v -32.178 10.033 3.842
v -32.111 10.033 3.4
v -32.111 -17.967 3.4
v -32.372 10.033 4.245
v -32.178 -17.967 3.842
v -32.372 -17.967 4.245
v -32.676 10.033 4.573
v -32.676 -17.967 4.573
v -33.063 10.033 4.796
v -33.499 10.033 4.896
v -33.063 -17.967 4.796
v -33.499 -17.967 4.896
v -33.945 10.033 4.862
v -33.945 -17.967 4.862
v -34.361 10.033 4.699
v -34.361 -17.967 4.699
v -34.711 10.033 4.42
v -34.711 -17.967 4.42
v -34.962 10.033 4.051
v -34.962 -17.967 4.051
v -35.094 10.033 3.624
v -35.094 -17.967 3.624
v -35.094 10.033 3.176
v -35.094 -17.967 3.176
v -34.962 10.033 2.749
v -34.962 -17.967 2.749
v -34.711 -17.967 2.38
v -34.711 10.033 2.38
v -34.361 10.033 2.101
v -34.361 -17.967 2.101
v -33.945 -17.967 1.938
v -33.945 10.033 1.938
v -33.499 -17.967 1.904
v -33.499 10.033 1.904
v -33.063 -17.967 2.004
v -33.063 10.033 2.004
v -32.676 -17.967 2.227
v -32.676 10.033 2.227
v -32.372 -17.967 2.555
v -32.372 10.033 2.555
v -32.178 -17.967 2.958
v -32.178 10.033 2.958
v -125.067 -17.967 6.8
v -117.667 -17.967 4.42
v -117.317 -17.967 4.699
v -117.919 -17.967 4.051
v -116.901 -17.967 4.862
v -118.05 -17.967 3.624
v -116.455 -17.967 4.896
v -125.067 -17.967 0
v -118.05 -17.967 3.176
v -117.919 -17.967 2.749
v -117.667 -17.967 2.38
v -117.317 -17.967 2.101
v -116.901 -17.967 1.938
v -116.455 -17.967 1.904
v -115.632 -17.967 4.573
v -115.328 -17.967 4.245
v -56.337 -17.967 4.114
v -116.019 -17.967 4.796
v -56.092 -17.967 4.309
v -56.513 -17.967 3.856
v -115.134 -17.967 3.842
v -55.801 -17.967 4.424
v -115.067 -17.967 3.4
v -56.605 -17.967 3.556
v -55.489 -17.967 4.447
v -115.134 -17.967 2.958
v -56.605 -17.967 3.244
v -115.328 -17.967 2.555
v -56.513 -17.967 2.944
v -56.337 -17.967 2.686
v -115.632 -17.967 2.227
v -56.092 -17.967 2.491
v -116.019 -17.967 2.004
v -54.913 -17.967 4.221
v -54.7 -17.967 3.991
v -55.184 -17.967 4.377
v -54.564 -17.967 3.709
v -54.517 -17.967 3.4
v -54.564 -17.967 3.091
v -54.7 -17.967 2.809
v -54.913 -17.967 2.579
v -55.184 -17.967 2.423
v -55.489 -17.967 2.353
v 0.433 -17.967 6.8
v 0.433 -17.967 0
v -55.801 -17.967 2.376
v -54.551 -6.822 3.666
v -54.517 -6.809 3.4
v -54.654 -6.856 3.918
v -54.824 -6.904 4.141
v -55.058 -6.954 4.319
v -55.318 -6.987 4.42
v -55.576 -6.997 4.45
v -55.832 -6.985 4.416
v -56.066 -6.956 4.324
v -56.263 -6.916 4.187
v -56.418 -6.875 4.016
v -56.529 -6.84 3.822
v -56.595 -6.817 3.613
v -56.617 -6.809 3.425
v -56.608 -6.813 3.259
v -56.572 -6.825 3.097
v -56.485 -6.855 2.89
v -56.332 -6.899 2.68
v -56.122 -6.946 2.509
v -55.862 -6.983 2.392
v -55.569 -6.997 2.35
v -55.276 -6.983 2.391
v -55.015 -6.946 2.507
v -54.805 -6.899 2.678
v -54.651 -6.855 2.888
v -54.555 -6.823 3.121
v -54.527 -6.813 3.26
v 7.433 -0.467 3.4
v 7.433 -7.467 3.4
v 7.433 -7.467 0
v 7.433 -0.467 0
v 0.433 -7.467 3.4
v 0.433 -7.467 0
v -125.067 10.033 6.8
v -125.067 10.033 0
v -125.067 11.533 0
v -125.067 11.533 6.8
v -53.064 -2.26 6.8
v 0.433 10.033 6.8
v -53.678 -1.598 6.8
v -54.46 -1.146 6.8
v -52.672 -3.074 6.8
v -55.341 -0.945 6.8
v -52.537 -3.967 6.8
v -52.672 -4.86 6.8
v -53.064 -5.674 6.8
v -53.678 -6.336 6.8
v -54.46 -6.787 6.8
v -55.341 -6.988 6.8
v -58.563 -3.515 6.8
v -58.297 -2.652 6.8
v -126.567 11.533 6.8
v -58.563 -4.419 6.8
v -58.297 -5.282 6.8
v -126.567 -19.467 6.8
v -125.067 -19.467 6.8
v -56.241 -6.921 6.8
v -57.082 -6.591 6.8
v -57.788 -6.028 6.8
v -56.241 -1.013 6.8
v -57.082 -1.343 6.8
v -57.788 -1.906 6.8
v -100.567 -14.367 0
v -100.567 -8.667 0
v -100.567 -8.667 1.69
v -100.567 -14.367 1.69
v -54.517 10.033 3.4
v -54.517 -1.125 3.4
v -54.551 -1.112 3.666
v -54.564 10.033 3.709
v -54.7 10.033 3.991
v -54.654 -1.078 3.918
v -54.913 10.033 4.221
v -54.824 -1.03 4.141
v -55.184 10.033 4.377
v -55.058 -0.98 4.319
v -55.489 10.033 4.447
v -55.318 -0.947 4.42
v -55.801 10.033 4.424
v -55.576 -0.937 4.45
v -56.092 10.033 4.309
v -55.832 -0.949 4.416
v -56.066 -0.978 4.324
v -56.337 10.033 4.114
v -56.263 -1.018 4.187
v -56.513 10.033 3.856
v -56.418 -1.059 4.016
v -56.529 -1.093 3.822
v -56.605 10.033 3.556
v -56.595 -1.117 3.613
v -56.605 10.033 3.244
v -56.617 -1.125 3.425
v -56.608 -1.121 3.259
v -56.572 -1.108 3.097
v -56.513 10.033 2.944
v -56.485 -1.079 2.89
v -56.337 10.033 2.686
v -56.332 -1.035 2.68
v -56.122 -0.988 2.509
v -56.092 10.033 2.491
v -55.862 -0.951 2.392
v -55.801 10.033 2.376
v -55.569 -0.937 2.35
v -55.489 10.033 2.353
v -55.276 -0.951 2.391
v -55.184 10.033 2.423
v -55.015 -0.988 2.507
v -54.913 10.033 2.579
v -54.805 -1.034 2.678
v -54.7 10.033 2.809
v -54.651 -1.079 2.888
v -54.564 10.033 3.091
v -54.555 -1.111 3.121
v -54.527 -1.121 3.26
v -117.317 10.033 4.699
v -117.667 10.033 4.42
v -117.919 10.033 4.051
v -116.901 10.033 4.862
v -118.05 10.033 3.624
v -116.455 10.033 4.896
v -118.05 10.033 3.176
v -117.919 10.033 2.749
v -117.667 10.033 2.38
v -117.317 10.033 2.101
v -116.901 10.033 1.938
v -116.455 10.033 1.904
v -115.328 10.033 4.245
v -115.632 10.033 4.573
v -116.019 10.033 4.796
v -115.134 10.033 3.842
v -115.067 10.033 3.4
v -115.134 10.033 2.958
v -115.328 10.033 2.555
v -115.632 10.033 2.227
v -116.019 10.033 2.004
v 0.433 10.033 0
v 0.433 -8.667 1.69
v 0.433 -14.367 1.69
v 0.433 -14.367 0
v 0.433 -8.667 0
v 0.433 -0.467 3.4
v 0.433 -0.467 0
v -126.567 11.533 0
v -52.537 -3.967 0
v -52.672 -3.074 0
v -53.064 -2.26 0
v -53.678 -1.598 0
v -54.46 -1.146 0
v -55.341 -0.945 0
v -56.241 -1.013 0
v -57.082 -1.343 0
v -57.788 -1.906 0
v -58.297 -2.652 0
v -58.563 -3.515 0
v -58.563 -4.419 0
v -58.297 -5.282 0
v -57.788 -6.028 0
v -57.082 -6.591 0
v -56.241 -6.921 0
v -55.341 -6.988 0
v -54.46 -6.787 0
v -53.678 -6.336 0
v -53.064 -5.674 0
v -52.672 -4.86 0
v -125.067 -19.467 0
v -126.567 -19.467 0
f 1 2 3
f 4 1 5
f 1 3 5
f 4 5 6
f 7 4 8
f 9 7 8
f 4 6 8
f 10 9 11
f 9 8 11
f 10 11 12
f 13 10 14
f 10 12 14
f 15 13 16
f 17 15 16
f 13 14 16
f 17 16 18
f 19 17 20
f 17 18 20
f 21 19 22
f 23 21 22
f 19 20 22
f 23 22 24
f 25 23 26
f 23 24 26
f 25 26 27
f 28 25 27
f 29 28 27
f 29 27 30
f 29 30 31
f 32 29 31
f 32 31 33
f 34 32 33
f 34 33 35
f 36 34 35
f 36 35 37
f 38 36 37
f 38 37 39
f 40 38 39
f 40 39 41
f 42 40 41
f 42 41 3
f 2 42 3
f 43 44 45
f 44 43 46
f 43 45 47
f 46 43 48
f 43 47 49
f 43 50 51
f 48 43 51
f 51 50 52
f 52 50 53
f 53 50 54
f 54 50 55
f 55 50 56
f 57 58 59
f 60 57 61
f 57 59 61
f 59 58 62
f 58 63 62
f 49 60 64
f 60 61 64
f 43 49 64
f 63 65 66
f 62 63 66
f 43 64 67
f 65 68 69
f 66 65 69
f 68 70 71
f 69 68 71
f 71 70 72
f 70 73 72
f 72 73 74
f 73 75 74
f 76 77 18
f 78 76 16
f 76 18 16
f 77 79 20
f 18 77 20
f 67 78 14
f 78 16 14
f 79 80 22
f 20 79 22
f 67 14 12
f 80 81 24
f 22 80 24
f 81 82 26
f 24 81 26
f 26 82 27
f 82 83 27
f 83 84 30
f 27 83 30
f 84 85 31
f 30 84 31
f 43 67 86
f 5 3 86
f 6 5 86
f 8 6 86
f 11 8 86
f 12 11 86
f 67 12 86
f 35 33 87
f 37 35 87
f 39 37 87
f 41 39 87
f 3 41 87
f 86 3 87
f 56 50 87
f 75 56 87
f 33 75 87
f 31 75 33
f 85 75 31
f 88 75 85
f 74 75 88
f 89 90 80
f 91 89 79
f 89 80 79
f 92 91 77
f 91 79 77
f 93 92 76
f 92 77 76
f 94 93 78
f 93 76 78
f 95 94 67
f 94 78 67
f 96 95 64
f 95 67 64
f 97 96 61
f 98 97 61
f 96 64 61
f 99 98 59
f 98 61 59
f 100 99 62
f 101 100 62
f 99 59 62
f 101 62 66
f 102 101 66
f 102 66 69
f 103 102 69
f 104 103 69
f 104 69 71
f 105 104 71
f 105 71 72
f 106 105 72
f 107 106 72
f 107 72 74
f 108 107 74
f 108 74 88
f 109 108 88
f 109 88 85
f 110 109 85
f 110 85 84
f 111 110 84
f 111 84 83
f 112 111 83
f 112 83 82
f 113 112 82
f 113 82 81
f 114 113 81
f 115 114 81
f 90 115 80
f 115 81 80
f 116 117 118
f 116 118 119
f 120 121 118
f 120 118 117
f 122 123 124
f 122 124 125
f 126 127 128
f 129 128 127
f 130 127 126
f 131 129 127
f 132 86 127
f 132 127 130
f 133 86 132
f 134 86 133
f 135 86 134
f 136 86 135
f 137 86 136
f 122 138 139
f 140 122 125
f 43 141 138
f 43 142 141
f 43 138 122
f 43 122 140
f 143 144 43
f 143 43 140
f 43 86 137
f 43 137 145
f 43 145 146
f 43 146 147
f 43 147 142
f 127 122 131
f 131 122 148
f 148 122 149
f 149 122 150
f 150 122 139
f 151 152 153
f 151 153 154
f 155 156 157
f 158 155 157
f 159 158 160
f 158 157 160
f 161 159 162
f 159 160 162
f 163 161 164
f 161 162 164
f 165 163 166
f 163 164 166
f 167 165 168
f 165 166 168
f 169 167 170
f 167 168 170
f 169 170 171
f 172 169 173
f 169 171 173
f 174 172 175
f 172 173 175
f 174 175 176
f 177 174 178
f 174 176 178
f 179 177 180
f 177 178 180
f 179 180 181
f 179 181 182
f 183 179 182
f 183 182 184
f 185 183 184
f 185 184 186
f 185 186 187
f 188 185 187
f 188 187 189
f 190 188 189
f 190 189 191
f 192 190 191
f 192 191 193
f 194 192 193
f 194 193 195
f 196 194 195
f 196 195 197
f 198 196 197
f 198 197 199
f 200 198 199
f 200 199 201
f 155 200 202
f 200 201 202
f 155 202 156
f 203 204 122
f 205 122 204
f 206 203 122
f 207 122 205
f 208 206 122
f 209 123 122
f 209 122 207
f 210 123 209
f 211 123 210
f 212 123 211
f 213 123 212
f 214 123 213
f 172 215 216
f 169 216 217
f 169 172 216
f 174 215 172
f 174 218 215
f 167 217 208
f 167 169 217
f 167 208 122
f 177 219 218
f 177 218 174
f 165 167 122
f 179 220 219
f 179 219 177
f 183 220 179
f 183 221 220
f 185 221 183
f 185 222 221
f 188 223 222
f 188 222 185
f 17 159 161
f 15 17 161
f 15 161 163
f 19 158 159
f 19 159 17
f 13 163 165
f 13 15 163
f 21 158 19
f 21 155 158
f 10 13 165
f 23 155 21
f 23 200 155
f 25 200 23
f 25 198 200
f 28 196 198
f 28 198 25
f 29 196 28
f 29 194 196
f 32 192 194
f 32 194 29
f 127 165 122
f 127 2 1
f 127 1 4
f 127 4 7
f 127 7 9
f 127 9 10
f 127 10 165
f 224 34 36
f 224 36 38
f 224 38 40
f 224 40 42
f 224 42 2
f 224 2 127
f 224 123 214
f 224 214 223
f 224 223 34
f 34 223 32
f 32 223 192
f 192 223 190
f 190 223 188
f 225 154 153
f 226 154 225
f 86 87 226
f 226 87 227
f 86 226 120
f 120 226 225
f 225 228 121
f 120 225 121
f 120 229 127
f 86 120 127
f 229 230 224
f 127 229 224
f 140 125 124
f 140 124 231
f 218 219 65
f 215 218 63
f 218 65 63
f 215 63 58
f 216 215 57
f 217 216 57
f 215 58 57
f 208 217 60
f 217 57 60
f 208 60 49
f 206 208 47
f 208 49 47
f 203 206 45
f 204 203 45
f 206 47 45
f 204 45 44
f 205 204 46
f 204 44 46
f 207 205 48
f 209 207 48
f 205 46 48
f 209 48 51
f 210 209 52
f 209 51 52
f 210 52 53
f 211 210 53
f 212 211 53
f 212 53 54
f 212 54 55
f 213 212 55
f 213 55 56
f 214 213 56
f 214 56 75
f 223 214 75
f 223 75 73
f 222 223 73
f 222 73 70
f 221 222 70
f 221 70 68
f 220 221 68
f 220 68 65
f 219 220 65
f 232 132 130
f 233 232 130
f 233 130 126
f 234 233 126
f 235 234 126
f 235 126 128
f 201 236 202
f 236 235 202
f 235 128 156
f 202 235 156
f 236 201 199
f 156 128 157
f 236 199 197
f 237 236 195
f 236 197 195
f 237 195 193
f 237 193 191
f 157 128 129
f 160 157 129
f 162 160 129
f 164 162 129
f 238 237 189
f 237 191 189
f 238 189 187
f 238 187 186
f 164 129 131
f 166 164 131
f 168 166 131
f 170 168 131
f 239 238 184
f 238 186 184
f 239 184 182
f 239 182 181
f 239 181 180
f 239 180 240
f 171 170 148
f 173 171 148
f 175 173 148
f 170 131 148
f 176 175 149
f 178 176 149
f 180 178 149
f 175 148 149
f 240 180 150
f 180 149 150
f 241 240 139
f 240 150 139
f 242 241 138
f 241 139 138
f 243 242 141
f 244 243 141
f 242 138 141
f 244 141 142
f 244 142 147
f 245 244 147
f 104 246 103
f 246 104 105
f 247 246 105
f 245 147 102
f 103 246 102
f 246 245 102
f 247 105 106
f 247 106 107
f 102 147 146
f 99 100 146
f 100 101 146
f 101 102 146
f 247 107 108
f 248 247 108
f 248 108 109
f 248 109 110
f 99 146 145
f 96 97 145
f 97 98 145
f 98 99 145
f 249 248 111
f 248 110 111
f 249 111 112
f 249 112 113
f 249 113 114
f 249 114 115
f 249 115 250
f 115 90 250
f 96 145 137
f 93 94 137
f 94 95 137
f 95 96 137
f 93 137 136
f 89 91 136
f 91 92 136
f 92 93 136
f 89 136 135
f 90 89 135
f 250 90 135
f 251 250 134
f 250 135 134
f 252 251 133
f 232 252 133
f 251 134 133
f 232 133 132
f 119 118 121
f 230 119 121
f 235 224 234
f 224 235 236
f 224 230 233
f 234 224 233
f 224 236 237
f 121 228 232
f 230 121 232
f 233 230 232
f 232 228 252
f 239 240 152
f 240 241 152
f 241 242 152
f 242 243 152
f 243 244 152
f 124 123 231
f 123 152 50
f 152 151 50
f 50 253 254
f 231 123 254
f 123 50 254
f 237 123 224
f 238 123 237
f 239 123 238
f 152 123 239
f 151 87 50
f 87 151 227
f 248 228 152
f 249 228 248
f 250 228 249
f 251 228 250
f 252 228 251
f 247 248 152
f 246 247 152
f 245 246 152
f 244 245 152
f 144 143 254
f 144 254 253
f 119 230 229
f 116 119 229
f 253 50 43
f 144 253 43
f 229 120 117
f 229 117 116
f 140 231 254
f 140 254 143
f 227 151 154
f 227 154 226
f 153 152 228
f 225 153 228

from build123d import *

# Parameters (mm, degrees)
SKETCH007_W     = 127
SKETCH007_H     = 28
PAD003_DEPTH    = 6.8
SKETCH008_W     = 1.5
SKETCH008_H     = 6.8
PAD004_DEPTH    = 1.5
SKETCH010_W     = 1.5
SKETCH010_H     = 6.8
PAD005_DEPTH    = 1.5
SKETCH012_R     = 3.03
POCKET004_DEPTH = 6.801
SKETCH013_R     = 1.05
SKETCH013_R_2   = 1.5
POCKET005_DEPTH = 29.501
SKETCH014_W     = 101
SKETCH014_H     = 5.7
POCKET006_DEPTH = 1.69
SKETCH021_W     = 7
SKETCH021_H     = 3.4
PAD009_DEPTH    = 7


with BuildPart() as part:
    # Sketch007 → Pad003 (new body)
    with BuildSketch(Plane(origin=(0.865, 0, 0), x_dir=(1, 0, 0), z_dir=(0, 0, 1))):
        with Locations((-63.932219, -3.966905)):
            Rectangle(SKETCH007_W, SKETCH007_H)
    extrude(amount=PAD003_DEPTH)

    # Sketch008 → Pad004 (new body)
    with BuildSketch(Plane(origin=(0.865, -17.966905, 0), x_dir=(1, 0, 0), z_dir=(0, -1, 0))):
        with Locations((-126.682219, 3.4)):
            Rectangle(SKETCH008_W, SKETCH008_H)
    extrude(amount=PAD004_DEPTH)

    # Sketch010 → Pad005 (new body)
    with BuildSketch(Plane(origin=(0.865, 10.033095, 0), x_dir=(-1, 0, 0), z_dir=(0, 1, 0))):
        with Locations((126.682219, 3.4)):
            Rectangle(SKETCH010_W, SKETCH010_H)
    extrude(amount=PAD005_DEPTH)

    # Sketch012 → Pocket004 (cut, through all)
    with BuildSketch(Plane(origin=(0.865, 0, 6.8), x_dir=(1, 0, 0), z_dir=(0, 0, 1))):
        with Locations((-56.432219, -3.966905)):
            Circle(SKETCH012_R)
    extrude(amount=-POCKET004_DEPTH, mode=Mode.SUBTRACT)

    # Sketch013 → Pocket005 (cut, through all)
    with BuildSketch(Plane(origin=(0.865, -17.966905, 0), x_dir=(1, 0, 0), z_dir=(0, -1, 0))):
        with Locations((-56.432219, 3.4)):
            Circle(SKETCH013_R)
        with Locations((-117.432219, 3.4)):
            Circle(SKETCH013_R_2)
        with Locations((-34.475986, 3.4)):
            Circle(SKETCH013_R_2)
    extrude(amount=-POCKET005_DEPTH, mode=Mode.SUBTRACT)

    # Sketch014 → Pocket006 (cut)
    with BuildSketch(Plane(origin=(0.865, 0, 0), x_dir=(1, 0, 0), z_dir=(0, 0, -1))):
        with Locations((-50.932219, 11.516905)):
            Rectangle(SKETCH014_W, SKETCH014_H)
    extrude(amount=-POCKET006_DEPTH, mode=Mode.SUBTRACT)

    # Sketch021 → Pad009 (new body)
    with BuildSketch(Plane.YZ.offset(0.432781)):
        with Locations((-3.966905, 1.7)):
            Rectangle(SKETCH021_W, SKETCH021_H)
    extrude(amount=PAD009_DEPTH)


solid = part.part
